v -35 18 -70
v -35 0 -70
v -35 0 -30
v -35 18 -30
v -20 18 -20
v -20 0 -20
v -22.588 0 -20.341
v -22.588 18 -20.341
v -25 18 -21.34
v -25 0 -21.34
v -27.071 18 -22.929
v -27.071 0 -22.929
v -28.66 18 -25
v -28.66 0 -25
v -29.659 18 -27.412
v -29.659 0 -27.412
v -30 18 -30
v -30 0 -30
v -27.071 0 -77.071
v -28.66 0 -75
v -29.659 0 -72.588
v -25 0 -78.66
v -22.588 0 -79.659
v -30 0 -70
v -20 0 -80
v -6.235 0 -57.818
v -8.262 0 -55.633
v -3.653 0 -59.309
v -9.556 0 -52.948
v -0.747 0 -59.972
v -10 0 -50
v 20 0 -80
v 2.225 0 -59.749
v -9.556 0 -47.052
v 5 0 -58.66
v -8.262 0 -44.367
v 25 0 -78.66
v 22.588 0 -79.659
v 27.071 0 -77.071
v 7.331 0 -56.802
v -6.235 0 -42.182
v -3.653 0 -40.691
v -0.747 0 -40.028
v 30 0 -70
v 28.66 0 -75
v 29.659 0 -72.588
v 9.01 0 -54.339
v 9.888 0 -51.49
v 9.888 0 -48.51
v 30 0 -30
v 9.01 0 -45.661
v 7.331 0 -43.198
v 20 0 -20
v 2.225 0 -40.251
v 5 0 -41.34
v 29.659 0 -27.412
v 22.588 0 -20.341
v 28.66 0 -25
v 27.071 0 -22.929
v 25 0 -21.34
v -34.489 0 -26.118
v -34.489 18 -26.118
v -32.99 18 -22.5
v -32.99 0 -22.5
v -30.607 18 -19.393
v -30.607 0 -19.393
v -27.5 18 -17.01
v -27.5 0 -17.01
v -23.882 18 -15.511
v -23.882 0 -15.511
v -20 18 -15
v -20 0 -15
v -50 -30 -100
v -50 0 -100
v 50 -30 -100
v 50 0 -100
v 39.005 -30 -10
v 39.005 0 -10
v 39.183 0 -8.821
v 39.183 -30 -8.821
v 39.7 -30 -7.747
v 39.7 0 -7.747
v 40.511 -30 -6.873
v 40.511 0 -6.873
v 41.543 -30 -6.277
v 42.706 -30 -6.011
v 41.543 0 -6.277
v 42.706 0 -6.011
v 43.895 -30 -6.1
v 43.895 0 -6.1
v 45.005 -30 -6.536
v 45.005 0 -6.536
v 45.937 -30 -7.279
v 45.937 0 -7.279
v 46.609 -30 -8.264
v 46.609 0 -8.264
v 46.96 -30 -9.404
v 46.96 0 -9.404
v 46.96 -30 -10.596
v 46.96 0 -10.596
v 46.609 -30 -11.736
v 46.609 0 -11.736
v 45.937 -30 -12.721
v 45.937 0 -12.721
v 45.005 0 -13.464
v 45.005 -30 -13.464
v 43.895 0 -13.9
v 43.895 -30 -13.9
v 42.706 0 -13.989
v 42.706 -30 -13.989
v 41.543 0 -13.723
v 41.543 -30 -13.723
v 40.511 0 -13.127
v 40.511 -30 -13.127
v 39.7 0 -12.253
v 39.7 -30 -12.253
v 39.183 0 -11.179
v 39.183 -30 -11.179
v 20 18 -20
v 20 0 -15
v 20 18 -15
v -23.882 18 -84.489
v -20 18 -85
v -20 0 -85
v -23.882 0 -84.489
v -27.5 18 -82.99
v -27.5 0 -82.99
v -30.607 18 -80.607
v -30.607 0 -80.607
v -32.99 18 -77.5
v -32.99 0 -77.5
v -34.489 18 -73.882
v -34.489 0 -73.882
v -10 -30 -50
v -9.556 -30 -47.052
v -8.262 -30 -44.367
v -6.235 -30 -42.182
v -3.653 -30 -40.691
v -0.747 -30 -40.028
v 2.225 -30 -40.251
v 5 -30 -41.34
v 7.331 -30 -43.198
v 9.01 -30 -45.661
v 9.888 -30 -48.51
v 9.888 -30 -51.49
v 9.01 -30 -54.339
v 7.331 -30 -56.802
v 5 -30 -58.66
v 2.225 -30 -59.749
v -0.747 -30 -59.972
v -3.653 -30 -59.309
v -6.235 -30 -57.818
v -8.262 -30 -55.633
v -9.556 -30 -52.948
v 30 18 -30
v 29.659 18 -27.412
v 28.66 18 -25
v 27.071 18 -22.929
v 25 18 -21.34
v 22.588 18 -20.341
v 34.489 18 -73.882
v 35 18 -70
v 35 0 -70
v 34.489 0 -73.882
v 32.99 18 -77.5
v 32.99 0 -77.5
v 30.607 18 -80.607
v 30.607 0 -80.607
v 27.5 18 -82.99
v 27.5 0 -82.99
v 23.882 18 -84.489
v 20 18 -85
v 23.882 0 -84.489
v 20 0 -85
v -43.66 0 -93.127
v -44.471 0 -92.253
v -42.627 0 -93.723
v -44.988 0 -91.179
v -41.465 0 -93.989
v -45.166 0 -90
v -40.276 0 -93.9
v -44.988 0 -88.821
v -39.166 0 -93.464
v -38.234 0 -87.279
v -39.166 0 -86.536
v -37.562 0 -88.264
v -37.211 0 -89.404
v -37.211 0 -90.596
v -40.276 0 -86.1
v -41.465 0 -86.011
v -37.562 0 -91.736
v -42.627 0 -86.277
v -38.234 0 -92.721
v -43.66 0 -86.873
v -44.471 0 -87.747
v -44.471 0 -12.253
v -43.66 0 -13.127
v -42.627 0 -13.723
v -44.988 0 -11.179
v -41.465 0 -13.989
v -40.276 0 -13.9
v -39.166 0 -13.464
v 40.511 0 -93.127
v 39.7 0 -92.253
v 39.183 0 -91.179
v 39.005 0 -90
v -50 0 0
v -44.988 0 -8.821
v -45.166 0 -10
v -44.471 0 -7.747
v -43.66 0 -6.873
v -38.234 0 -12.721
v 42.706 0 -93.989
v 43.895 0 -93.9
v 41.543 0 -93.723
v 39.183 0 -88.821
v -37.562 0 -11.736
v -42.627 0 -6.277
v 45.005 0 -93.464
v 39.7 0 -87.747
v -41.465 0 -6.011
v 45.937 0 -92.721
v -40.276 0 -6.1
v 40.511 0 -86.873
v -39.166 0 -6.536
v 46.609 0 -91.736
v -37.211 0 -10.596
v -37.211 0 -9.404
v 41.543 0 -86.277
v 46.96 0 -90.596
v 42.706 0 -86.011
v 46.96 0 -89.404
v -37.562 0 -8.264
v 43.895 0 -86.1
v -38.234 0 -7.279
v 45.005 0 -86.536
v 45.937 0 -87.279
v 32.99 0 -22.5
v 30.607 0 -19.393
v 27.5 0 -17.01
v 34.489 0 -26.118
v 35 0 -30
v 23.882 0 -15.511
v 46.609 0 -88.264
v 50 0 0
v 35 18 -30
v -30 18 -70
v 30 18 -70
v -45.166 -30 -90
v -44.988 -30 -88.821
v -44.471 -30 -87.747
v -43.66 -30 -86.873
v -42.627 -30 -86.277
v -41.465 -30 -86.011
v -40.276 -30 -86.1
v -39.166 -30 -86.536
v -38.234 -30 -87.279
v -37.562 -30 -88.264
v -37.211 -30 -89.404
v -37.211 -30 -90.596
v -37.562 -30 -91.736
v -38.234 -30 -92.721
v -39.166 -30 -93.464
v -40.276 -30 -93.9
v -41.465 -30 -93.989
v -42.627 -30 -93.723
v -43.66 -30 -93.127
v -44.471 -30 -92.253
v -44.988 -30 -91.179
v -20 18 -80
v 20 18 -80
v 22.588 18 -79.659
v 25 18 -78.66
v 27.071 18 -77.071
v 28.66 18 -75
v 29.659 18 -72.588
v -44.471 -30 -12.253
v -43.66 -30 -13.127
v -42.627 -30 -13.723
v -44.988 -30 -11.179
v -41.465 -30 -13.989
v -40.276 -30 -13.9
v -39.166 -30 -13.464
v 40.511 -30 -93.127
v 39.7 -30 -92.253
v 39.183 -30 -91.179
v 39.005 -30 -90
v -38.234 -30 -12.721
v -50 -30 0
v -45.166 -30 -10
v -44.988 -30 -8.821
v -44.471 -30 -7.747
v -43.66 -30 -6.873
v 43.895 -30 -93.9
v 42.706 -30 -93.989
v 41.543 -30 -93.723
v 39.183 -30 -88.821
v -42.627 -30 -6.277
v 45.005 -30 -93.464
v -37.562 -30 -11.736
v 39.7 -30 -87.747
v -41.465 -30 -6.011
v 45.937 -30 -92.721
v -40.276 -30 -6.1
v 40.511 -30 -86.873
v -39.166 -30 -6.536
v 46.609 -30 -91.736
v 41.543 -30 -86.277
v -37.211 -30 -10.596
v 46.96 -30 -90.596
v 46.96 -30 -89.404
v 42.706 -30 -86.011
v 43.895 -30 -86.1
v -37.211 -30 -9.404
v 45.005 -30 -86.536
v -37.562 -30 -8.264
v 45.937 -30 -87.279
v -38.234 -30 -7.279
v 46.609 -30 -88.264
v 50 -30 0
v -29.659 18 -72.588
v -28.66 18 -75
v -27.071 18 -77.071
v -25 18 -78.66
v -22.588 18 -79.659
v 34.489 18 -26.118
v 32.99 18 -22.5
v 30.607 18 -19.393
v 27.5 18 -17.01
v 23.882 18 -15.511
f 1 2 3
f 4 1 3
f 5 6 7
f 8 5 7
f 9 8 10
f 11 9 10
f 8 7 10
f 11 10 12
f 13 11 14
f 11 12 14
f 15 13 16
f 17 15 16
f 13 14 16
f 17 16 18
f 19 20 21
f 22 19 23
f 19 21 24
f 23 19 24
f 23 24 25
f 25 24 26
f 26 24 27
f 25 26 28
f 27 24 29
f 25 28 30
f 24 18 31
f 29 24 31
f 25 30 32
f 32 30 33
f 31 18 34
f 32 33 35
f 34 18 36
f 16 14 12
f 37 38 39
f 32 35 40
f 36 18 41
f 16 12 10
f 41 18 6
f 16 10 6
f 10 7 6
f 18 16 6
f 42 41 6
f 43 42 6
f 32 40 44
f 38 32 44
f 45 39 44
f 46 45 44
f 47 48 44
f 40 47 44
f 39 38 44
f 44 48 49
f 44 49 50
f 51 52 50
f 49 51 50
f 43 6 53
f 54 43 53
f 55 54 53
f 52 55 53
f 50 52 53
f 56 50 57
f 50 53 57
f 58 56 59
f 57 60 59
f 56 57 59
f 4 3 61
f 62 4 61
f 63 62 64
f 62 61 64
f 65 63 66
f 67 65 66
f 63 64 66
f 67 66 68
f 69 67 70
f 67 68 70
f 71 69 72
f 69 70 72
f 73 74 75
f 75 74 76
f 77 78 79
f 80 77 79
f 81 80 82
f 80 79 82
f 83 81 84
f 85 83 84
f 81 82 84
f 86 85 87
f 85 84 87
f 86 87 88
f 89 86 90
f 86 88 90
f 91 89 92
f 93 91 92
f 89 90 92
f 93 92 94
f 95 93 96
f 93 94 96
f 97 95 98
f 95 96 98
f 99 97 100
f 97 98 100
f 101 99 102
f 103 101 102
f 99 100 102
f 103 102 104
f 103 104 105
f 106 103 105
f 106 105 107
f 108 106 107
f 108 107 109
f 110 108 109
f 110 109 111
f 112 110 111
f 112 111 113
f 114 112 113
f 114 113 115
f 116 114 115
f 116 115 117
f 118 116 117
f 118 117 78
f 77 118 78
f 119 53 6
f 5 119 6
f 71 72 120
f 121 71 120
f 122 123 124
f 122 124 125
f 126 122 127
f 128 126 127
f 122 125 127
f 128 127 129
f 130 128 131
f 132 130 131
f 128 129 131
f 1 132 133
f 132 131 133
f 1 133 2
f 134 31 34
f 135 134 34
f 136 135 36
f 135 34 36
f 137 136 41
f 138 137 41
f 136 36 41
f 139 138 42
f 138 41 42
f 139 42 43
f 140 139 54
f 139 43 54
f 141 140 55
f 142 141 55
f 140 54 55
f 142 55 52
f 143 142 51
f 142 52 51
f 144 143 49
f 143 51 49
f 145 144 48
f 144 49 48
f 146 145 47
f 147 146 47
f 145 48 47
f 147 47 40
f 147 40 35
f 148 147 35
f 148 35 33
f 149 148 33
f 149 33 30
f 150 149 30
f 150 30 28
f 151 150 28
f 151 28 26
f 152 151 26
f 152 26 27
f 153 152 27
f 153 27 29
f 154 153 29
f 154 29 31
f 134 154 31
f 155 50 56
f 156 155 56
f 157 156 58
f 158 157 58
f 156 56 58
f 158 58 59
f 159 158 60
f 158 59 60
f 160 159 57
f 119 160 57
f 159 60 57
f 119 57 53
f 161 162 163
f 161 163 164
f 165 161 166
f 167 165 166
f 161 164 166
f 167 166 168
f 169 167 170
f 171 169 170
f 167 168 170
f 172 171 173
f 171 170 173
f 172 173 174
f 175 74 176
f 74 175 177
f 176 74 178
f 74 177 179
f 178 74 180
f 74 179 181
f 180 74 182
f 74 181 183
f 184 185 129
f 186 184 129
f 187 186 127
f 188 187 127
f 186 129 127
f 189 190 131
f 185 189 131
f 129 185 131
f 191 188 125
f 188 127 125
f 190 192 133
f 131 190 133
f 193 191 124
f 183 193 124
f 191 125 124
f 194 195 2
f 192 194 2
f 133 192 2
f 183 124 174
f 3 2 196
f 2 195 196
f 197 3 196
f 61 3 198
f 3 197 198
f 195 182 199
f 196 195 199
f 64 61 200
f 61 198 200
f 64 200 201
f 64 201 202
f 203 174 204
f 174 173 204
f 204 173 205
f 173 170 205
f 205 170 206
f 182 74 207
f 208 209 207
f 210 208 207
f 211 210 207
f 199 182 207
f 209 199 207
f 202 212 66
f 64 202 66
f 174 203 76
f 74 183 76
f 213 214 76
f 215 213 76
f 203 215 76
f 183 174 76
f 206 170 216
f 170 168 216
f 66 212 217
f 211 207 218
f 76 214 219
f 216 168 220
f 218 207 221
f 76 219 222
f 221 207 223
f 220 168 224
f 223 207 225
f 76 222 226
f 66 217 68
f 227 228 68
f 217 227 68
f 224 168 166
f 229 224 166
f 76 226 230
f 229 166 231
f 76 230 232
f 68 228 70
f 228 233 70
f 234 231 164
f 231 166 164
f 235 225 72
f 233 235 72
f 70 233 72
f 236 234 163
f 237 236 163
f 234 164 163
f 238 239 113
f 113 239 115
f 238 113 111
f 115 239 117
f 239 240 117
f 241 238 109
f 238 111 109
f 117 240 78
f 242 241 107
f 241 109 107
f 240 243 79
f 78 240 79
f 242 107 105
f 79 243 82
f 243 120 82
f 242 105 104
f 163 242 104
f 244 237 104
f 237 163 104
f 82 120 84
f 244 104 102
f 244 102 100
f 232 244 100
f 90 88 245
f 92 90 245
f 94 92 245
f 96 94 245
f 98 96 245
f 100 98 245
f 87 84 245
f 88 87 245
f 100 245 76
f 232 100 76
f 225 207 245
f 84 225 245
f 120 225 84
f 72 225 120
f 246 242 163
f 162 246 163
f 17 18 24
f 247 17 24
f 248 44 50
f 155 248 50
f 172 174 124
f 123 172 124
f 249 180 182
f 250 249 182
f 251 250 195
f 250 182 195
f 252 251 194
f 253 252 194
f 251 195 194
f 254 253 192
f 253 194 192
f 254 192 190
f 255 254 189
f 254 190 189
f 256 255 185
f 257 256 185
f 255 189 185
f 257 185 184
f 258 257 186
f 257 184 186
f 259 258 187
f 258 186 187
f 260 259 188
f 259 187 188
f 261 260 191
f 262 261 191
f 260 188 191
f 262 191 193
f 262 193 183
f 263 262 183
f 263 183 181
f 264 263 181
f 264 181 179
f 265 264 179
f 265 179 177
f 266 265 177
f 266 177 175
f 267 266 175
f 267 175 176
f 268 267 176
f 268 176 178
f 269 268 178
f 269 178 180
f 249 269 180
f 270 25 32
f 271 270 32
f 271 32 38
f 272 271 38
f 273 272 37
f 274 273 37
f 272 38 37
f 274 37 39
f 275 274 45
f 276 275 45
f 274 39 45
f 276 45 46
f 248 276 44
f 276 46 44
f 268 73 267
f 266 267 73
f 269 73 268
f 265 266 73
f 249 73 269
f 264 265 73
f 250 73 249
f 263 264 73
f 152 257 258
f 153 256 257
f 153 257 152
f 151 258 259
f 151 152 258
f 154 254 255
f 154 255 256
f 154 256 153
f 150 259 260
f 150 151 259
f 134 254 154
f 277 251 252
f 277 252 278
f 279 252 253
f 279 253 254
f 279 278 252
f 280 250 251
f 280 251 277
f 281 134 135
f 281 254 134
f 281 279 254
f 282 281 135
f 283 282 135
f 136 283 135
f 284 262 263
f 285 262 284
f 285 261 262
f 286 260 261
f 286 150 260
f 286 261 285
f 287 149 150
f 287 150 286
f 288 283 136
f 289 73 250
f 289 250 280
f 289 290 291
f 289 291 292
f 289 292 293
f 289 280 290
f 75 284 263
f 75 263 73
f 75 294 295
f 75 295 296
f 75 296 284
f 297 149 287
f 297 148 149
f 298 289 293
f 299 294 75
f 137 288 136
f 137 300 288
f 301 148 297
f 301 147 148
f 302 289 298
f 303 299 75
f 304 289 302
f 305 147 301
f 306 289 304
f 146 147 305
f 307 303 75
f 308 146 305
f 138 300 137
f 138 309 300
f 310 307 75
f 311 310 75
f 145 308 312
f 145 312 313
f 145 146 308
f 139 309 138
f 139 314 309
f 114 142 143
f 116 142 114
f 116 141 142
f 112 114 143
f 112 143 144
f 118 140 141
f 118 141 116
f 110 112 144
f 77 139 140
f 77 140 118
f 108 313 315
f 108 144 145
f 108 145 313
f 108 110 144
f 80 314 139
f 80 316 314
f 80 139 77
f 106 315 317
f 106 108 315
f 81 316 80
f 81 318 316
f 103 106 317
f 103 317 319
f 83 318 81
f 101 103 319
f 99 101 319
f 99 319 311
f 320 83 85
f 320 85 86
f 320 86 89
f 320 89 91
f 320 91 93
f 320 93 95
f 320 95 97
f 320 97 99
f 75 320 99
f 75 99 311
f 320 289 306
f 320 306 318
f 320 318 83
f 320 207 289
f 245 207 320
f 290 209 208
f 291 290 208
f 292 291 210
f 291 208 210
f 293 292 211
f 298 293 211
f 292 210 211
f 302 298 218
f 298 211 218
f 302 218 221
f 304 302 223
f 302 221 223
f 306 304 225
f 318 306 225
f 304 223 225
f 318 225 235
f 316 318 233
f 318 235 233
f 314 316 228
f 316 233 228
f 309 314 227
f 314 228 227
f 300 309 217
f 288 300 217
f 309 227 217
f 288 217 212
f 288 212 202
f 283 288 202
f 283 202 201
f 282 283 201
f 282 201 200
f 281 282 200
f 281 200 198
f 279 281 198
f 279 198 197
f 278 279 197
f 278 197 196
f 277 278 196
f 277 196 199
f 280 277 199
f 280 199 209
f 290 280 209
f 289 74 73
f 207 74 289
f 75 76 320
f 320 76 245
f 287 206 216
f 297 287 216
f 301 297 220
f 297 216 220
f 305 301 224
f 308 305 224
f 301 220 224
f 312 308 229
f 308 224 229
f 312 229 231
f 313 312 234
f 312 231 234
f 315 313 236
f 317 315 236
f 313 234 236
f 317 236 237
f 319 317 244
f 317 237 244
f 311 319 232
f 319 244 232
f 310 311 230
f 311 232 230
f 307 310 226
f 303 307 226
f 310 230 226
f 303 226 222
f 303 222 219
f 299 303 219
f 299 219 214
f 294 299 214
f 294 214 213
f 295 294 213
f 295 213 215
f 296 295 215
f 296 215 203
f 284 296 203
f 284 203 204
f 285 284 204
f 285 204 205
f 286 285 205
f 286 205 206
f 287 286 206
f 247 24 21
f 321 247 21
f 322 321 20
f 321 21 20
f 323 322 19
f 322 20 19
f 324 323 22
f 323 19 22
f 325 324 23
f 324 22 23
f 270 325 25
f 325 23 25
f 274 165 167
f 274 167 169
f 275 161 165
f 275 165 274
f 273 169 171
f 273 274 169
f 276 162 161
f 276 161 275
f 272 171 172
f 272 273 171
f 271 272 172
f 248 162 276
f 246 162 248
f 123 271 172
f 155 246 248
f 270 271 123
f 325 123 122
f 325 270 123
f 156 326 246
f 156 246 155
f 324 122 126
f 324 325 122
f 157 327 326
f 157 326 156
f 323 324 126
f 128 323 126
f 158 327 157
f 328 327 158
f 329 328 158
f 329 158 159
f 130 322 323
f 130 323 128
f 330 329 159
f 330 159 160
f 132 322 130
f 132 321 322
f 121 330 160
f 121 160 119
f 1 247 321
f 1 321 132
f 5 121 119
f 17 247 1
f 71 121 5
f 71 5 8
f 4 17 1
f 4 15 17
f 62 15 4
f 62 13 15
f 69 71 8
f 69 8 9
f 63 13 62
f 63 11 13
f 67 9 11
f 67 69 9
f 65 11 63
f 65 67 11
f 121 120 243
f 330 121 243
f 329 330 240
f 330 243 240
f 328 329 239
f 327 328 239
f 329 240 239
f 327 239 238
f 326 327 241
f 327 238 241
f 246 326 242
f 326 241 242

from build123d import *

# Parameters (mm, degrees)
F0_W     = 100
F0_H     = 100
F1_DEPTH = 30
F3_DEPTH = 18
F4_R     = 10
F4_R_2   = 4
F5_DEPTH = 30.001


with BuildPart() as f1:
    # F0 (on Front) → F1 (new body)
    with BuildSketch(Plane.XZ):
        with Locations((0, -50)):
            Rectangle(F0_W, F0_H)
    extrude(amount=F1_DEPTH)

    # F2 (on face) → F3 (join)
    with BuildSketch(Plane(origin=(0, 0, 0), x_dir=(-1, 0, 0), z_dir=(0, 1, 0))):
        with BuildLine():
            ThreePointArc((-35, -70), (-30.606602, -80.606602), (-20, -85))
            Line((-20, -85), (20, -85))
            ThreePointArc((20, -85), (30.606602, -80.606602), (35, -70))
            Line((35, -70), (35, -30))
            ThreePointArc((35, -30), (30.606602, -19.393398), (20, -15))
            Line((20, -15), (-20, -15))
            ThreePointArc((-20, -15), (-30.606602, -19.393398), (-35, -30))
            Line((-35, -30), (-35, -70))
        make_face()
        with BuildLine():
            Line((20, -80), (-20, -80))
            ThreePointArc((-20, -80), (-27.071068, -77.071068), (-30, -70))
            Line((-30, -70), (-30, -30))
            ThreePointArc((-30, -30), (-27.071068, -22.928932), (-20, -20))
            Line((-20, -20), (20, -20))
            ThreePointArc((20, -20), (27.071068, -22.928932), (30, -30))
            Line((30, -30), (30, -70))
            ThreePointArc((30, -70), (27.071068, -77.071068), (20, -80))
        make_face(mode=Mode.SUBTRACT)
    extrude(amount=F3_DEPTH)

    # F4 (on face) → F5 (cut, through all)
    with BuildSketch(Plane(origin=(0, 0, 0), x_dir=(-1, 0, 0), z_dir=(0, 1, 0))):
        with Locations((0, -50)):
            Circle(F4_R)
        with Locations((41.16613, -90)):
            Circle(F4_R_2)
        with Locations((41.16613, -10)):
            Circle(F4_R_2)
        with Locations((-43.004811, -90)):
            Circle(F4_R_2)
        with Locations((-43.004811, -10)):
            Circle(F4_R_2)
    extrude(amount=-F5_DEPTH, mode=Mode.SUBTRACT)


solid = f1.part
